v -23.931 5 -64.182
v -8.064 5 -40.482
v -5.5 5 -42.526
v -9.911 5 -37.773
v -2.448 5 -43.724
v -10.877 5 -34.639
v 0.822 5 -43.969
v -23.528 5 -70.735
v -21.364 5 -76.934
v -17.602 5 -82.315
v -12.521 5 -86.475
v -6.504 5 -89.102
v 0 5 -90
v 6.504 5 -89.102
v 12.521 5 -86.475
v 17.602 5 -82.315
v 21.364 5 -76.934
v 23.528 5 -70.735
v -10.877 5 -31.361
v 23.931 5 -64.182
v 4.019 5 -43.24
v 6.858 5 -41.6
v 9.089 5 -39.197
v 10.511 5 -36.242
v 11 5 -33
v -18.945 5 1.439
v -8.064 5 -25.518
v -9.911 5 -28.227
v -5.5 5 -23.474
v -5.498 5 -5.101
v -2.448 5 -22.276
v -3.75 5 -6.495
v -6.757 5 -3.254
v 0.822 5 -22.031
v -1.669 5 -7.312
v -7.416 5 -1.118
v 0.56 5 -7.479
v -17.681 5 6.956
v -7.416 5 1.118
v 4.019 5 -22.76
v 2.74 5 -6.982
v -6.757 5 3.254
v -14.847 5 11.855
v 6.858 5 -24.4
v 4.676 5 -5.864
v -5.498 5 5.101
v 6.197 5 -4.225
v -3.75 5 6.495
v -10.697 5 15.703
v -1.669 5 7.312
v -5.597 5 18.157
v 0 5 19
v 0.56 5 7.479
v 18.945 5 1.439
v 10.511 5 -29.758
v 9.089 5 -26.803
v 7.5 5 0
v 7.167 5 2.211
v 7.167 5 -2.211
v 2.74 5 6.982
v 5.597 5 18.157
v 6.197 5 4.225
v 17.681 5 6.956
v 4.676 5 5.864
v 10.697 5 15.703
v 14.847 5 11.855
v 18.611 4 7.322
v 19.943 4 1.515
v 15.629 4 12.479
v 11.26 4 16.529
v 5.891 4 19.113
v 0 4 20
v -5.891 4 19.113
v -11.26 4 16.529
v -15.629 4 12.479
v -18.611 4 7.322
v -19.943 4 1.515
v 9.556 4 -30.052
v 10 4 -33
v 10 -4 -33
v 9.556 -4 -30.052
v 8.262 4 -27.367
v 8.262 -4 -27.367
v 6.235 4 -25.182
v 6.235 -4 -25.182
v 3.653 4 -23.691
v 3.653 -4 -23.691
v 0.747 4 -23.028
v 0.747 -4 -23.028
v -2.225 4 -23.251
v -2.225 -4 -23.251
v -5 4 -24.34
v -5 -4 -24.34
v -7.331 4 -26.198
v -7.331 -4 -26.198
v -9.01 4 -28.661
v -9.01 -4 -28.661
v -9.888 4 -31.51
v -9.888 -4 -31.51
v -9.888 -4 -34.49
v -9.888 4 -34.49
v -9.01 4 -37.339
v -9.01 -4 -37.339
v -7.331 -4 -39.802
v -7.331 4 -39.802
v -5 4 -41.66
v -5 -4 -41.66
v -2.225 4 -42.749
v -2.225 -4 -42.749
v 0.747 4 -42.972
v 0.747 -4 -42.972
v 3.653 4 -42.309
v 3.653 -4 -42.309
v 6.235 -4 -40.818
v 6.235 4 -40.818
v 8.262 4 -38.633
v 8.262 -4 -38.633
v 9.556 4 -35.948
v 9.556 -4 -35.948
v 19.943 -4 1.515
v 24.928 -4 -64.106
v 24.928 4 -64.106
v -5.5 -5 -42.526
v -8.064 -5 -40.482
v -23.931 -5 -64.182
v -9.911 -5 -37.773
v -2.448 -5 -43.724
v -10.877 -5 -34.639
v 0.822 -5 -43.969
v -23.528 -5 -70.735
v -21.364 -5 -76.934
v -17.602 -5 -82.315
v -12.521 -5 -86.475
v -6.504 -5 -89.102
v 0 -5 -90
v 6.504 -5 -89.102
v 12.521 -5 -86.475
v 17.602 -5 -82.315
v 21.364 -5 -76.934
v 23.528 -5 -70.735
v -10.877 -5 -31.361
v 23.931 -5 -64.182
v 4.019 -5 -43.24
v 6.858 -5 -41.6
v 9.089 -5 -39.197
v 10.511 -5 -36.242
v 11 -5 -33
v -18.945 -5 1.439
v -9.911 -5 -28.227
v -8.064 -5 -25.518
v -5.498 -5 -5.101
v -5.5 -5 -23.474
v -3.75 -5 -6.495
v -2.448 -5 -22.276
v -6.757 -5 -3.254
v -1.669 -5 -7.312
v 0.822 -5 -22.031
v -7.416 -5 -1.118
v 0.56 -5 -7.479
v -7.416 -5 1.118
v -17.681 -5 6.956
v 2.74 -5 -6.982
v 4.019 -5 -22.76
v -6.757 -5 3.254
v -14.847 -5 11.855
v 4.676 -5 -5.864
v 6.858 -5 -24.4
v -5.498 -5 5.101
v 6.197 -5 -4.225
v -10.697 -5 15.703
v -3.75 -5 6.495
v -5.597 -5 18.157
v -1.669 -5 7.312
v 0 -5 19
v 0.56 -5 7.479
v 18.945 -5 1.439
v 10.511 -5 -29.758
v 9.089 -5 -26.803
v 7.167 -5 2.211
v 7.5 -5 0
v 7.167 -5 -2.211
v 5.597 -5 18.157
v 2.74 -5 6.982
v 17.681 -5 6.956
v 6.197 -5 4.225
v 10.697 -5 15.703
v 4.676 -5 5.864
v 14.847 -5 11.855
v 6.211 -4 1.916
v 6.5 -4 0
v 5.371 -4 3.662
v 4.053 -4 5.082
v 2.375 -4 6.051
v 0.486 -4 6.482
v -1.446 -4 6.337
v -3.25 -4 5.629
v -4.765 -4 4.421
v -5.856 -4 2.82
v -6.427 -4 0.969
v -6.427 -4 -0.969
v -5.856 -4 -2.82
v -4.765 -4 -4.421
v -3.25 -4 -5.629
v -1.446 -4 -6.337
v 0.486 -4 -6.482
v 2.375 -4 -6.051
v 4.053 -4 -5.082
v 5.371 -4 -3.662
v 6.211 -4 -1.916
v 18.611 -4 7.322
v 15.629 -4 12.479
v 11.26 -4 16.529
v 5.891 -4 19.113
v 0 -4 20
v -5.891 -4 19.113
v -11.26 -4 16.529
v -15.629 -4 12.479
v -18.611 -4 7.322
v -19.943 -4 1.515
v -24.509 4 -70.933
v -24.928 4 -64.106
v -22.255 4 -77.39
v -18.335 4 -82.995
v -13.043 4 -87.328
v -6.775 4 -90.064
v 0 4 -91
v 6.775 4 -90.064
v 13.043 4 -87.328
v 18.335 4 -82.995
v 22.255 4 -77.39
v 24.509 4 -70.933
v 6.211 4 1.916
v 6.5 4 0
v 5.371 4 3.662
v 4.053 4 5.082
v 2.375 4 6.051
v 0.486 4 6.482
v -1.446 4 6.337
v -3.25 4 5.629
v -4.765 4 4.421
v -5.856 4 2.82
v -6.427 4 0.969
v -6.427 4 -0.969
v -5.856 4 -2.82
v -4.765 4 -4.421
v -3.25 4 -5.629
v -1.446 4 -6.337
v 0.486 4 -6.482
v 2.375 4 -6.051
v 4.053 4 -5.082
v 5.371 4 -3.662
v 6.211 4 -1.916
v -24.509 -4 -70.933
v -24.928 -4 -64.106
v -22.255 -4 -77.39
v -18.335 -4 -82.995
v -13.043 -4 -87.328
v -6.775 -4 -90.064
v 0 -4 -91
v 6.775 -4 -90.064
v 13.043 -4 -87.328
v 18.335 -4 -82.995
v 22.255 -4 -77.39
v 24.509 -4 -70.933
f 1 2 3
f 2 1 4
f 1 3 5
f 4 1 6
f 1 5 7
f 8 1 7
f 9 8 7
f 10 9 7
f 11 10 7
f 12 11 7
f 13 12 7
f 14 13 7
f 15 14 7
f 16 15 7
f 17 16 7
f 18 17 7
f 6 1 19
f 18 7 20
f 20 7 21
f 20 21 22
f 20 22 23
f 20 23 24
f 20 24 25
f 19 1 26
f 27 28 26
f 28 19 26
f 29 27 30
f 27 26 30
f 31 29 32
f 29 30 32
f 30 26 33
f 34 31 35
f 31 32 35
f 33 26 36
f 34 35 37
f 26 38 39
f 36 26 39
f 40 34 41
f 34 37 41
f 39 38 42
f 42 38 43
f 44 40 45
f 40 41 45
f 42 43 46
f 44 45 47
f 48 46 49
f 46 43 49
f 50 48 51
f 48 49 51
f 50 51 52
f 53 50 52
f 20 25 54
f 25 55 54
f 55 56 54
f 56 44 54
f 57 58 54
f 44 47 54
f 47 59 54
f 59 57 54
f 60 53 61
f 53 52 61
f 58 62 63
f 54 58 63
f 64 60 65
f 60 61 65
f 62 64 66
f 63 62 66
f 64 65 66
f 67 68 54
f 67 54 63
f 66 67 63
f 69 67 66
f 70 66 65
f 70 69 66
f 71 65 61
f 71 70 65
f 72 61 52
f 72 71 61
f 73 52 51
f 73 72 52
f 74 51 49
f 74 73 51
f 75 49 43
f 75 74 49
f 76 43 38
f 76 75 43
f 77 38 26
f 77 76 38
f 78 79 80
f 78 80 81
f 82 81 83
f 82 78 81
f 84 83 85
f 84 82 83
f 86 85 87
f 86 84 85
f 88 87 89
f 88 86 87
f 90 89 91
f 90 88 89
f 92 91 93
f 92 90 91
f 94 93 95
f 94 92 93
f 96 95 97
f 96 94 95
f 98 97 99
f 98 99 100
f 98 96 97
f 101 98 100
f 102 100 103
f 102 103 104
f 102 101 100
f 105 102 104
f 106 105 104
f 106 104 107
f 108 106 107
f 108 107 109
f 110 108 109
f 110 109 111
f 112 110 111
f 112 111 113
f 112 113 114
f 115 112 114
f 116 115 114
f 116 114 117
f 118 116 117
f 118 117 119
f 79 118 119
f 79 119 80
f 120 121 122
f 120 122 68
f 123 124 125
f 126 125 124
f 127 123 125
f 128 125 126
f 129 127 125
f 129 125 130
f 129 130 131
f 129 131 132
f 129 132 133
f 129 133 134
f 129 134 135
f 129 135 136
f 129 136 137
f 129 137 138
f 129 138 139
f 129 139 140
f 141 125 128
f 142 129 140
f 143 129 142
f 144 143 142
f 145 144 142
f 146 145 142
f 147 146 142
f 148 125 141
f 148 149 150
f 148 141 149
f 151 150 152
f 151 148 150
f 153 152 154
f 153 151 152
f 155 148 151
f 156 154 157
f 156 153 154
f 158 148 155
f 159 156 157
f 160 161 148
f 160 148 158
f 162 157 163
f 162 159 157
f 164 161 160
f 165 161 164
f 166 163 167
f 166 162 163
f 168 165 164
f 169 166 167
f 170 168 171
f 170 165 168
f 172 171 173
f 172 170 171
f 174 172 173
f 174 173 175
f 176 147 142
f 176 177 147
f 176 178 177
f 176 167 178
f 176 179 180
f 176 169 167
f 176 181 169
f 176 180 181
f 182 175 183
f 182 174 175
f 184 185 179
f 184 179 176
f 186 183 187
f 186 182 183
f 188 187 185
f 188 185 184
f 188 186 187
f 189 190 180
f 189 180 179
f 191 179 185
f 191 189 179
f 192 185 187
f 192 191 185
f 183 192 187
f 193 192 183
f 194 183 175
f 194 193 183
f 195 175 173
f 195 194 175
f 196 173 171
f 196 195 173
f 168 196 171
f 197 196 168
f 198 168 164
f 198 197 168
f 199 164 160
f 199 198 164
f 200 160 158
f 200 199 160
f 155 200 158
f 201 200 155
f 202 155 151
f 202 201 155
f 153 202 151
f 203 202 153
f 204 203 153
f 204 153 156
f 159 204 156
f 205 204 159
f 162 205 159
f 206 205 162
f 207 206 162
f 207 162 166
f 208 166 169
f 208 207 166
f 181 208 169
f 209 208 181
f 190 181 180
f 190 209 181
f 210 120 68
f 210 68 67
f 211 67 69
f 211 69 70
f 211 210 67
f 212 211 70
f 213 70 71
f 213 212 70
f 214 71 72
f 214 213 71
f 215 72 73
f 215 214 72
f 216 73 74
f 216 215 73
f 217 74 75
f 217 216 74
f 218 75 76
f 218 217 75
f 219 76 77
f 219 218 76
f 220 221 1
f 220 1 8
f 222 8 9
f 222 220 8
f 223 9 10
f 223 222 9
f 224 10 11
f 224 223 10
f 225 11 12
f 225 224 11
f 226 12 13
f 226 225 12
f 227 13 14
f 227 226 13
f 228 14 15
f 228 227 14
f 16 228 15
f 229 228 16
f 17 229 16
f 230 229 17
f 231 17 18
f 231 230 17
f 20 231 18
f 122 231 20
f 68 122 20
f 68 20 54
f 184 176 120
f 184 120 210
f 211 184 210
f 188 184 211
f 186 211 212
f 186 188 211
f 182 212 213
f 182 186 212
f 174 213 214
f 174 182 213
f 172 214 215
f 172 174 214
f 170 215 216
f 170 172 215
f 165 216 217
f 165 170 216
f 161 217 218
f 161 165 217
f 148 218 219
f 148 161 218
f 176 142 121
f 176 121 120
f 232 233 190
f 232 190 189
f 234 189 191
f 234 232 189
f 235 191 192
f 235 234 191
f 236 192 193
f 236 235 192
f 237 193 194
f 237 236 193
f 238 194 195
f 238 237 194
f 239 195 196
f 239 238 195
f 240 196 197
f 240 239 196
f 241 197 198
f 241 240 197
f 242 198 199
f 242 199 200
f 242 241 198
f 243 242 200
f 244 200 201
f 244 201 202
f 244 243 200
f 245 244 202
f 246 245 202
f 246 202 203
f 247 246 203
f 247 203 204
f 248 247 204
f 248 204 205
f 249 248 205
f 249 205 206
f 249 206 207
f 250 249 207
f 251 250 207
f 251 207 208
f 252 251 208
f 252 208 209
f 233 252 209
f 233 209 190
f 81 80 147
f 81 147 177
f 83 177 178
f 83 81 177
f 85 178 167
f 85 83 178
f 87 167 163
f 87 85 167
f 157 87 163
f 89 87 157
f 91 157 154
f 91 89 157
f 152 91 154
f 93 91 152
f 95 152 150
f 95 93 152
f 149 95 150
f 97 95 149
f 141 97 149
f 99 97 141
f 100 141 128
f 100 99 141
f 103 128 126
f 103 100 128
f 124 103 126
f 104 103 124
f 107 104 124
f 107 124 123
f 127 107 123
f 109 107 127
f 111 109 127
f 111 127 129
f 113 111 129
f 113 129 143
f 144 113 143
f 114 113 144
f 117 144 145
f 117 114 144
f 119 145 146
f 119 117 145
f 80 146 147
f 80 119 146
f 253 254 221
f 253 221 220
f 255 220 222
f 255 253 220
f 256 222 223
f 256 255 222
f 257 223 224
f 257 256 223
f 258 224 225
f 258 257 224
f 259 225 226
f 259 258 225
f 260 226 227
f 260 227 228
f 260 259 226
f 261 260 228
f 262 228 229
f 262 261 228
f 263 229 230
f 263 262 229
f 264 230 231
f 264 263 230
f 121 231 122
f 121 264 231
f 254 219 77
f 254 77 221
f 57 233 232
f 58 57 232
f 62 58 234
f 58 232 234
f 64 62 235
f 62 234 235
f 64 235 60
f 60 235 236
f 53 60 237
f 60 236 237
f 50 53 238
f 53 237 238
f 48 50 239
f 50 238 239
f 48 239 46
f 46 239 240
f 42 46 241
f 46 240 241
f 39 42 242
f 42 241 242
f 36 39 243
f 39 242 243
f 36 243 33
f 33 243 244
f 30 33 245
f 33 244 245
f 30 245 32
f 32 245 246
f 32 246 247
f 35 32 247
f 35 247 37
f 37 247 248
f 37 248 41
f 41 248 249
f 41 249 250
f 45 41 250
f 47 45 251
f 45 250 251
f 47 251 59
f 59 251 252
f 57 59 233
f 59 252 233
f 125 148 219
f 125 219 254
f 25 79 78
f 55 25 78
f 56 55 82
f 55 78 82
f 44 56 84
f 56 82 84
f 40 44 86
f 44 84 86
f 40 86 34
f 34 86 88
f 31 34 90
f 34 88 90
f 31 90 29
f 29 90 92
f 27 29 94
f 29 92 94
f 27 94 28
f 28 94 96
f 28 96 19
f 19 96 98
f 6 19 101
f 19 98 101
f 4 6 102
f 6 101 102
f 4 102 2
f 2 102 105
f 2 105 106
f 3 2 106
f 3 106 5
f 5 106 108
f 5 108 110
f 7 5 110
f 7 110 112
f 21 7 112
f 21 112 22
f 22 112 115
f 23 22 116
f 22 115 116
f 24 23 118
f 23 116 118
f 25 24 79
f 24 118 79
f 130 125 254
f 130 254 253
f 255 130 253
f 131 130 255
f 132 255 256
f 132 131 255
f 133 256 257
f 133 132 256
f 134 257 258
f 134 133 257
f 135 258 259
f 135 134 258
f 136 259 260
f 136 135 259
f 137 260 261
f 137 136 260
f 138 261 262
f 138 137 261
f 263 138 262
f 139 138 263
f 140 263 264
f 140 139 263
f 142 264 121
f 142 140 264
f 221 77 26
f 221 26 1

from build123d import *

# Parameters (mm, degrees)
F0_R     = 10
F0_R_2   = 6.5
F1_DEPTH = 5
F2_SIZE2 = 1
F2_SIZE  = 1
F3_SIZE2 = 1
F3_SIZE  = 1


with BuildPart() as f1:
    # F0 (on Front) → F1 (new body, symmetric)
    with BuildSketch(Plane.XZ):
        with BuildLine():
            Line((-19.942525, 1.515152), (-24.928157, -64.106061))
            ThreePointArc((-24.928157, -64.106061), (0, -91), (24.928157, -64.106061))
            Line((24.928157, -64.106061), (19.942525, 1.515152))
            ThreePointArc((19.942525, 1.515152), (0, 20), (-19.942525, 1.515152))
        make_face()
        with Locations((0, -33)):
            Circle(F0_R, mode=Mode.SUBTRACT)
        Circle(F0_R_2, mode=Mode.SUBTRACT)
    extrude(amount=F1_DEPTH, both=True)

    # F2
    f2_edges = [f1.edges().sort_by_distance(p)[0] for p in [
        (0, -5, 20),
        (-22.435341, -5, -31.295455),
        (0, -5, -91),
        (22.435341, -5, -31.295455),
        (-10, -5, -33),
        (-6.5, -5, 0),
    ]]
    chamfer(f2_edges, length=F2_SIZE, length2=F2_SIZE2)

    # F3
    f3_edges = [f1.edges().sort_by_distance(p)[0] for p in [
        (0, 5, 20),
        (-22.435341, 5, -31.295455),
        (0, 5, -91),
        (22.435341, 5, -31.295455),
        (-10, 5, -33),
        (-6.5, 5, 0),
    ]]
    chamfer(f3_edges, length=F3_SIZE, length2=F3_SIZE2)


solid = f1.part
